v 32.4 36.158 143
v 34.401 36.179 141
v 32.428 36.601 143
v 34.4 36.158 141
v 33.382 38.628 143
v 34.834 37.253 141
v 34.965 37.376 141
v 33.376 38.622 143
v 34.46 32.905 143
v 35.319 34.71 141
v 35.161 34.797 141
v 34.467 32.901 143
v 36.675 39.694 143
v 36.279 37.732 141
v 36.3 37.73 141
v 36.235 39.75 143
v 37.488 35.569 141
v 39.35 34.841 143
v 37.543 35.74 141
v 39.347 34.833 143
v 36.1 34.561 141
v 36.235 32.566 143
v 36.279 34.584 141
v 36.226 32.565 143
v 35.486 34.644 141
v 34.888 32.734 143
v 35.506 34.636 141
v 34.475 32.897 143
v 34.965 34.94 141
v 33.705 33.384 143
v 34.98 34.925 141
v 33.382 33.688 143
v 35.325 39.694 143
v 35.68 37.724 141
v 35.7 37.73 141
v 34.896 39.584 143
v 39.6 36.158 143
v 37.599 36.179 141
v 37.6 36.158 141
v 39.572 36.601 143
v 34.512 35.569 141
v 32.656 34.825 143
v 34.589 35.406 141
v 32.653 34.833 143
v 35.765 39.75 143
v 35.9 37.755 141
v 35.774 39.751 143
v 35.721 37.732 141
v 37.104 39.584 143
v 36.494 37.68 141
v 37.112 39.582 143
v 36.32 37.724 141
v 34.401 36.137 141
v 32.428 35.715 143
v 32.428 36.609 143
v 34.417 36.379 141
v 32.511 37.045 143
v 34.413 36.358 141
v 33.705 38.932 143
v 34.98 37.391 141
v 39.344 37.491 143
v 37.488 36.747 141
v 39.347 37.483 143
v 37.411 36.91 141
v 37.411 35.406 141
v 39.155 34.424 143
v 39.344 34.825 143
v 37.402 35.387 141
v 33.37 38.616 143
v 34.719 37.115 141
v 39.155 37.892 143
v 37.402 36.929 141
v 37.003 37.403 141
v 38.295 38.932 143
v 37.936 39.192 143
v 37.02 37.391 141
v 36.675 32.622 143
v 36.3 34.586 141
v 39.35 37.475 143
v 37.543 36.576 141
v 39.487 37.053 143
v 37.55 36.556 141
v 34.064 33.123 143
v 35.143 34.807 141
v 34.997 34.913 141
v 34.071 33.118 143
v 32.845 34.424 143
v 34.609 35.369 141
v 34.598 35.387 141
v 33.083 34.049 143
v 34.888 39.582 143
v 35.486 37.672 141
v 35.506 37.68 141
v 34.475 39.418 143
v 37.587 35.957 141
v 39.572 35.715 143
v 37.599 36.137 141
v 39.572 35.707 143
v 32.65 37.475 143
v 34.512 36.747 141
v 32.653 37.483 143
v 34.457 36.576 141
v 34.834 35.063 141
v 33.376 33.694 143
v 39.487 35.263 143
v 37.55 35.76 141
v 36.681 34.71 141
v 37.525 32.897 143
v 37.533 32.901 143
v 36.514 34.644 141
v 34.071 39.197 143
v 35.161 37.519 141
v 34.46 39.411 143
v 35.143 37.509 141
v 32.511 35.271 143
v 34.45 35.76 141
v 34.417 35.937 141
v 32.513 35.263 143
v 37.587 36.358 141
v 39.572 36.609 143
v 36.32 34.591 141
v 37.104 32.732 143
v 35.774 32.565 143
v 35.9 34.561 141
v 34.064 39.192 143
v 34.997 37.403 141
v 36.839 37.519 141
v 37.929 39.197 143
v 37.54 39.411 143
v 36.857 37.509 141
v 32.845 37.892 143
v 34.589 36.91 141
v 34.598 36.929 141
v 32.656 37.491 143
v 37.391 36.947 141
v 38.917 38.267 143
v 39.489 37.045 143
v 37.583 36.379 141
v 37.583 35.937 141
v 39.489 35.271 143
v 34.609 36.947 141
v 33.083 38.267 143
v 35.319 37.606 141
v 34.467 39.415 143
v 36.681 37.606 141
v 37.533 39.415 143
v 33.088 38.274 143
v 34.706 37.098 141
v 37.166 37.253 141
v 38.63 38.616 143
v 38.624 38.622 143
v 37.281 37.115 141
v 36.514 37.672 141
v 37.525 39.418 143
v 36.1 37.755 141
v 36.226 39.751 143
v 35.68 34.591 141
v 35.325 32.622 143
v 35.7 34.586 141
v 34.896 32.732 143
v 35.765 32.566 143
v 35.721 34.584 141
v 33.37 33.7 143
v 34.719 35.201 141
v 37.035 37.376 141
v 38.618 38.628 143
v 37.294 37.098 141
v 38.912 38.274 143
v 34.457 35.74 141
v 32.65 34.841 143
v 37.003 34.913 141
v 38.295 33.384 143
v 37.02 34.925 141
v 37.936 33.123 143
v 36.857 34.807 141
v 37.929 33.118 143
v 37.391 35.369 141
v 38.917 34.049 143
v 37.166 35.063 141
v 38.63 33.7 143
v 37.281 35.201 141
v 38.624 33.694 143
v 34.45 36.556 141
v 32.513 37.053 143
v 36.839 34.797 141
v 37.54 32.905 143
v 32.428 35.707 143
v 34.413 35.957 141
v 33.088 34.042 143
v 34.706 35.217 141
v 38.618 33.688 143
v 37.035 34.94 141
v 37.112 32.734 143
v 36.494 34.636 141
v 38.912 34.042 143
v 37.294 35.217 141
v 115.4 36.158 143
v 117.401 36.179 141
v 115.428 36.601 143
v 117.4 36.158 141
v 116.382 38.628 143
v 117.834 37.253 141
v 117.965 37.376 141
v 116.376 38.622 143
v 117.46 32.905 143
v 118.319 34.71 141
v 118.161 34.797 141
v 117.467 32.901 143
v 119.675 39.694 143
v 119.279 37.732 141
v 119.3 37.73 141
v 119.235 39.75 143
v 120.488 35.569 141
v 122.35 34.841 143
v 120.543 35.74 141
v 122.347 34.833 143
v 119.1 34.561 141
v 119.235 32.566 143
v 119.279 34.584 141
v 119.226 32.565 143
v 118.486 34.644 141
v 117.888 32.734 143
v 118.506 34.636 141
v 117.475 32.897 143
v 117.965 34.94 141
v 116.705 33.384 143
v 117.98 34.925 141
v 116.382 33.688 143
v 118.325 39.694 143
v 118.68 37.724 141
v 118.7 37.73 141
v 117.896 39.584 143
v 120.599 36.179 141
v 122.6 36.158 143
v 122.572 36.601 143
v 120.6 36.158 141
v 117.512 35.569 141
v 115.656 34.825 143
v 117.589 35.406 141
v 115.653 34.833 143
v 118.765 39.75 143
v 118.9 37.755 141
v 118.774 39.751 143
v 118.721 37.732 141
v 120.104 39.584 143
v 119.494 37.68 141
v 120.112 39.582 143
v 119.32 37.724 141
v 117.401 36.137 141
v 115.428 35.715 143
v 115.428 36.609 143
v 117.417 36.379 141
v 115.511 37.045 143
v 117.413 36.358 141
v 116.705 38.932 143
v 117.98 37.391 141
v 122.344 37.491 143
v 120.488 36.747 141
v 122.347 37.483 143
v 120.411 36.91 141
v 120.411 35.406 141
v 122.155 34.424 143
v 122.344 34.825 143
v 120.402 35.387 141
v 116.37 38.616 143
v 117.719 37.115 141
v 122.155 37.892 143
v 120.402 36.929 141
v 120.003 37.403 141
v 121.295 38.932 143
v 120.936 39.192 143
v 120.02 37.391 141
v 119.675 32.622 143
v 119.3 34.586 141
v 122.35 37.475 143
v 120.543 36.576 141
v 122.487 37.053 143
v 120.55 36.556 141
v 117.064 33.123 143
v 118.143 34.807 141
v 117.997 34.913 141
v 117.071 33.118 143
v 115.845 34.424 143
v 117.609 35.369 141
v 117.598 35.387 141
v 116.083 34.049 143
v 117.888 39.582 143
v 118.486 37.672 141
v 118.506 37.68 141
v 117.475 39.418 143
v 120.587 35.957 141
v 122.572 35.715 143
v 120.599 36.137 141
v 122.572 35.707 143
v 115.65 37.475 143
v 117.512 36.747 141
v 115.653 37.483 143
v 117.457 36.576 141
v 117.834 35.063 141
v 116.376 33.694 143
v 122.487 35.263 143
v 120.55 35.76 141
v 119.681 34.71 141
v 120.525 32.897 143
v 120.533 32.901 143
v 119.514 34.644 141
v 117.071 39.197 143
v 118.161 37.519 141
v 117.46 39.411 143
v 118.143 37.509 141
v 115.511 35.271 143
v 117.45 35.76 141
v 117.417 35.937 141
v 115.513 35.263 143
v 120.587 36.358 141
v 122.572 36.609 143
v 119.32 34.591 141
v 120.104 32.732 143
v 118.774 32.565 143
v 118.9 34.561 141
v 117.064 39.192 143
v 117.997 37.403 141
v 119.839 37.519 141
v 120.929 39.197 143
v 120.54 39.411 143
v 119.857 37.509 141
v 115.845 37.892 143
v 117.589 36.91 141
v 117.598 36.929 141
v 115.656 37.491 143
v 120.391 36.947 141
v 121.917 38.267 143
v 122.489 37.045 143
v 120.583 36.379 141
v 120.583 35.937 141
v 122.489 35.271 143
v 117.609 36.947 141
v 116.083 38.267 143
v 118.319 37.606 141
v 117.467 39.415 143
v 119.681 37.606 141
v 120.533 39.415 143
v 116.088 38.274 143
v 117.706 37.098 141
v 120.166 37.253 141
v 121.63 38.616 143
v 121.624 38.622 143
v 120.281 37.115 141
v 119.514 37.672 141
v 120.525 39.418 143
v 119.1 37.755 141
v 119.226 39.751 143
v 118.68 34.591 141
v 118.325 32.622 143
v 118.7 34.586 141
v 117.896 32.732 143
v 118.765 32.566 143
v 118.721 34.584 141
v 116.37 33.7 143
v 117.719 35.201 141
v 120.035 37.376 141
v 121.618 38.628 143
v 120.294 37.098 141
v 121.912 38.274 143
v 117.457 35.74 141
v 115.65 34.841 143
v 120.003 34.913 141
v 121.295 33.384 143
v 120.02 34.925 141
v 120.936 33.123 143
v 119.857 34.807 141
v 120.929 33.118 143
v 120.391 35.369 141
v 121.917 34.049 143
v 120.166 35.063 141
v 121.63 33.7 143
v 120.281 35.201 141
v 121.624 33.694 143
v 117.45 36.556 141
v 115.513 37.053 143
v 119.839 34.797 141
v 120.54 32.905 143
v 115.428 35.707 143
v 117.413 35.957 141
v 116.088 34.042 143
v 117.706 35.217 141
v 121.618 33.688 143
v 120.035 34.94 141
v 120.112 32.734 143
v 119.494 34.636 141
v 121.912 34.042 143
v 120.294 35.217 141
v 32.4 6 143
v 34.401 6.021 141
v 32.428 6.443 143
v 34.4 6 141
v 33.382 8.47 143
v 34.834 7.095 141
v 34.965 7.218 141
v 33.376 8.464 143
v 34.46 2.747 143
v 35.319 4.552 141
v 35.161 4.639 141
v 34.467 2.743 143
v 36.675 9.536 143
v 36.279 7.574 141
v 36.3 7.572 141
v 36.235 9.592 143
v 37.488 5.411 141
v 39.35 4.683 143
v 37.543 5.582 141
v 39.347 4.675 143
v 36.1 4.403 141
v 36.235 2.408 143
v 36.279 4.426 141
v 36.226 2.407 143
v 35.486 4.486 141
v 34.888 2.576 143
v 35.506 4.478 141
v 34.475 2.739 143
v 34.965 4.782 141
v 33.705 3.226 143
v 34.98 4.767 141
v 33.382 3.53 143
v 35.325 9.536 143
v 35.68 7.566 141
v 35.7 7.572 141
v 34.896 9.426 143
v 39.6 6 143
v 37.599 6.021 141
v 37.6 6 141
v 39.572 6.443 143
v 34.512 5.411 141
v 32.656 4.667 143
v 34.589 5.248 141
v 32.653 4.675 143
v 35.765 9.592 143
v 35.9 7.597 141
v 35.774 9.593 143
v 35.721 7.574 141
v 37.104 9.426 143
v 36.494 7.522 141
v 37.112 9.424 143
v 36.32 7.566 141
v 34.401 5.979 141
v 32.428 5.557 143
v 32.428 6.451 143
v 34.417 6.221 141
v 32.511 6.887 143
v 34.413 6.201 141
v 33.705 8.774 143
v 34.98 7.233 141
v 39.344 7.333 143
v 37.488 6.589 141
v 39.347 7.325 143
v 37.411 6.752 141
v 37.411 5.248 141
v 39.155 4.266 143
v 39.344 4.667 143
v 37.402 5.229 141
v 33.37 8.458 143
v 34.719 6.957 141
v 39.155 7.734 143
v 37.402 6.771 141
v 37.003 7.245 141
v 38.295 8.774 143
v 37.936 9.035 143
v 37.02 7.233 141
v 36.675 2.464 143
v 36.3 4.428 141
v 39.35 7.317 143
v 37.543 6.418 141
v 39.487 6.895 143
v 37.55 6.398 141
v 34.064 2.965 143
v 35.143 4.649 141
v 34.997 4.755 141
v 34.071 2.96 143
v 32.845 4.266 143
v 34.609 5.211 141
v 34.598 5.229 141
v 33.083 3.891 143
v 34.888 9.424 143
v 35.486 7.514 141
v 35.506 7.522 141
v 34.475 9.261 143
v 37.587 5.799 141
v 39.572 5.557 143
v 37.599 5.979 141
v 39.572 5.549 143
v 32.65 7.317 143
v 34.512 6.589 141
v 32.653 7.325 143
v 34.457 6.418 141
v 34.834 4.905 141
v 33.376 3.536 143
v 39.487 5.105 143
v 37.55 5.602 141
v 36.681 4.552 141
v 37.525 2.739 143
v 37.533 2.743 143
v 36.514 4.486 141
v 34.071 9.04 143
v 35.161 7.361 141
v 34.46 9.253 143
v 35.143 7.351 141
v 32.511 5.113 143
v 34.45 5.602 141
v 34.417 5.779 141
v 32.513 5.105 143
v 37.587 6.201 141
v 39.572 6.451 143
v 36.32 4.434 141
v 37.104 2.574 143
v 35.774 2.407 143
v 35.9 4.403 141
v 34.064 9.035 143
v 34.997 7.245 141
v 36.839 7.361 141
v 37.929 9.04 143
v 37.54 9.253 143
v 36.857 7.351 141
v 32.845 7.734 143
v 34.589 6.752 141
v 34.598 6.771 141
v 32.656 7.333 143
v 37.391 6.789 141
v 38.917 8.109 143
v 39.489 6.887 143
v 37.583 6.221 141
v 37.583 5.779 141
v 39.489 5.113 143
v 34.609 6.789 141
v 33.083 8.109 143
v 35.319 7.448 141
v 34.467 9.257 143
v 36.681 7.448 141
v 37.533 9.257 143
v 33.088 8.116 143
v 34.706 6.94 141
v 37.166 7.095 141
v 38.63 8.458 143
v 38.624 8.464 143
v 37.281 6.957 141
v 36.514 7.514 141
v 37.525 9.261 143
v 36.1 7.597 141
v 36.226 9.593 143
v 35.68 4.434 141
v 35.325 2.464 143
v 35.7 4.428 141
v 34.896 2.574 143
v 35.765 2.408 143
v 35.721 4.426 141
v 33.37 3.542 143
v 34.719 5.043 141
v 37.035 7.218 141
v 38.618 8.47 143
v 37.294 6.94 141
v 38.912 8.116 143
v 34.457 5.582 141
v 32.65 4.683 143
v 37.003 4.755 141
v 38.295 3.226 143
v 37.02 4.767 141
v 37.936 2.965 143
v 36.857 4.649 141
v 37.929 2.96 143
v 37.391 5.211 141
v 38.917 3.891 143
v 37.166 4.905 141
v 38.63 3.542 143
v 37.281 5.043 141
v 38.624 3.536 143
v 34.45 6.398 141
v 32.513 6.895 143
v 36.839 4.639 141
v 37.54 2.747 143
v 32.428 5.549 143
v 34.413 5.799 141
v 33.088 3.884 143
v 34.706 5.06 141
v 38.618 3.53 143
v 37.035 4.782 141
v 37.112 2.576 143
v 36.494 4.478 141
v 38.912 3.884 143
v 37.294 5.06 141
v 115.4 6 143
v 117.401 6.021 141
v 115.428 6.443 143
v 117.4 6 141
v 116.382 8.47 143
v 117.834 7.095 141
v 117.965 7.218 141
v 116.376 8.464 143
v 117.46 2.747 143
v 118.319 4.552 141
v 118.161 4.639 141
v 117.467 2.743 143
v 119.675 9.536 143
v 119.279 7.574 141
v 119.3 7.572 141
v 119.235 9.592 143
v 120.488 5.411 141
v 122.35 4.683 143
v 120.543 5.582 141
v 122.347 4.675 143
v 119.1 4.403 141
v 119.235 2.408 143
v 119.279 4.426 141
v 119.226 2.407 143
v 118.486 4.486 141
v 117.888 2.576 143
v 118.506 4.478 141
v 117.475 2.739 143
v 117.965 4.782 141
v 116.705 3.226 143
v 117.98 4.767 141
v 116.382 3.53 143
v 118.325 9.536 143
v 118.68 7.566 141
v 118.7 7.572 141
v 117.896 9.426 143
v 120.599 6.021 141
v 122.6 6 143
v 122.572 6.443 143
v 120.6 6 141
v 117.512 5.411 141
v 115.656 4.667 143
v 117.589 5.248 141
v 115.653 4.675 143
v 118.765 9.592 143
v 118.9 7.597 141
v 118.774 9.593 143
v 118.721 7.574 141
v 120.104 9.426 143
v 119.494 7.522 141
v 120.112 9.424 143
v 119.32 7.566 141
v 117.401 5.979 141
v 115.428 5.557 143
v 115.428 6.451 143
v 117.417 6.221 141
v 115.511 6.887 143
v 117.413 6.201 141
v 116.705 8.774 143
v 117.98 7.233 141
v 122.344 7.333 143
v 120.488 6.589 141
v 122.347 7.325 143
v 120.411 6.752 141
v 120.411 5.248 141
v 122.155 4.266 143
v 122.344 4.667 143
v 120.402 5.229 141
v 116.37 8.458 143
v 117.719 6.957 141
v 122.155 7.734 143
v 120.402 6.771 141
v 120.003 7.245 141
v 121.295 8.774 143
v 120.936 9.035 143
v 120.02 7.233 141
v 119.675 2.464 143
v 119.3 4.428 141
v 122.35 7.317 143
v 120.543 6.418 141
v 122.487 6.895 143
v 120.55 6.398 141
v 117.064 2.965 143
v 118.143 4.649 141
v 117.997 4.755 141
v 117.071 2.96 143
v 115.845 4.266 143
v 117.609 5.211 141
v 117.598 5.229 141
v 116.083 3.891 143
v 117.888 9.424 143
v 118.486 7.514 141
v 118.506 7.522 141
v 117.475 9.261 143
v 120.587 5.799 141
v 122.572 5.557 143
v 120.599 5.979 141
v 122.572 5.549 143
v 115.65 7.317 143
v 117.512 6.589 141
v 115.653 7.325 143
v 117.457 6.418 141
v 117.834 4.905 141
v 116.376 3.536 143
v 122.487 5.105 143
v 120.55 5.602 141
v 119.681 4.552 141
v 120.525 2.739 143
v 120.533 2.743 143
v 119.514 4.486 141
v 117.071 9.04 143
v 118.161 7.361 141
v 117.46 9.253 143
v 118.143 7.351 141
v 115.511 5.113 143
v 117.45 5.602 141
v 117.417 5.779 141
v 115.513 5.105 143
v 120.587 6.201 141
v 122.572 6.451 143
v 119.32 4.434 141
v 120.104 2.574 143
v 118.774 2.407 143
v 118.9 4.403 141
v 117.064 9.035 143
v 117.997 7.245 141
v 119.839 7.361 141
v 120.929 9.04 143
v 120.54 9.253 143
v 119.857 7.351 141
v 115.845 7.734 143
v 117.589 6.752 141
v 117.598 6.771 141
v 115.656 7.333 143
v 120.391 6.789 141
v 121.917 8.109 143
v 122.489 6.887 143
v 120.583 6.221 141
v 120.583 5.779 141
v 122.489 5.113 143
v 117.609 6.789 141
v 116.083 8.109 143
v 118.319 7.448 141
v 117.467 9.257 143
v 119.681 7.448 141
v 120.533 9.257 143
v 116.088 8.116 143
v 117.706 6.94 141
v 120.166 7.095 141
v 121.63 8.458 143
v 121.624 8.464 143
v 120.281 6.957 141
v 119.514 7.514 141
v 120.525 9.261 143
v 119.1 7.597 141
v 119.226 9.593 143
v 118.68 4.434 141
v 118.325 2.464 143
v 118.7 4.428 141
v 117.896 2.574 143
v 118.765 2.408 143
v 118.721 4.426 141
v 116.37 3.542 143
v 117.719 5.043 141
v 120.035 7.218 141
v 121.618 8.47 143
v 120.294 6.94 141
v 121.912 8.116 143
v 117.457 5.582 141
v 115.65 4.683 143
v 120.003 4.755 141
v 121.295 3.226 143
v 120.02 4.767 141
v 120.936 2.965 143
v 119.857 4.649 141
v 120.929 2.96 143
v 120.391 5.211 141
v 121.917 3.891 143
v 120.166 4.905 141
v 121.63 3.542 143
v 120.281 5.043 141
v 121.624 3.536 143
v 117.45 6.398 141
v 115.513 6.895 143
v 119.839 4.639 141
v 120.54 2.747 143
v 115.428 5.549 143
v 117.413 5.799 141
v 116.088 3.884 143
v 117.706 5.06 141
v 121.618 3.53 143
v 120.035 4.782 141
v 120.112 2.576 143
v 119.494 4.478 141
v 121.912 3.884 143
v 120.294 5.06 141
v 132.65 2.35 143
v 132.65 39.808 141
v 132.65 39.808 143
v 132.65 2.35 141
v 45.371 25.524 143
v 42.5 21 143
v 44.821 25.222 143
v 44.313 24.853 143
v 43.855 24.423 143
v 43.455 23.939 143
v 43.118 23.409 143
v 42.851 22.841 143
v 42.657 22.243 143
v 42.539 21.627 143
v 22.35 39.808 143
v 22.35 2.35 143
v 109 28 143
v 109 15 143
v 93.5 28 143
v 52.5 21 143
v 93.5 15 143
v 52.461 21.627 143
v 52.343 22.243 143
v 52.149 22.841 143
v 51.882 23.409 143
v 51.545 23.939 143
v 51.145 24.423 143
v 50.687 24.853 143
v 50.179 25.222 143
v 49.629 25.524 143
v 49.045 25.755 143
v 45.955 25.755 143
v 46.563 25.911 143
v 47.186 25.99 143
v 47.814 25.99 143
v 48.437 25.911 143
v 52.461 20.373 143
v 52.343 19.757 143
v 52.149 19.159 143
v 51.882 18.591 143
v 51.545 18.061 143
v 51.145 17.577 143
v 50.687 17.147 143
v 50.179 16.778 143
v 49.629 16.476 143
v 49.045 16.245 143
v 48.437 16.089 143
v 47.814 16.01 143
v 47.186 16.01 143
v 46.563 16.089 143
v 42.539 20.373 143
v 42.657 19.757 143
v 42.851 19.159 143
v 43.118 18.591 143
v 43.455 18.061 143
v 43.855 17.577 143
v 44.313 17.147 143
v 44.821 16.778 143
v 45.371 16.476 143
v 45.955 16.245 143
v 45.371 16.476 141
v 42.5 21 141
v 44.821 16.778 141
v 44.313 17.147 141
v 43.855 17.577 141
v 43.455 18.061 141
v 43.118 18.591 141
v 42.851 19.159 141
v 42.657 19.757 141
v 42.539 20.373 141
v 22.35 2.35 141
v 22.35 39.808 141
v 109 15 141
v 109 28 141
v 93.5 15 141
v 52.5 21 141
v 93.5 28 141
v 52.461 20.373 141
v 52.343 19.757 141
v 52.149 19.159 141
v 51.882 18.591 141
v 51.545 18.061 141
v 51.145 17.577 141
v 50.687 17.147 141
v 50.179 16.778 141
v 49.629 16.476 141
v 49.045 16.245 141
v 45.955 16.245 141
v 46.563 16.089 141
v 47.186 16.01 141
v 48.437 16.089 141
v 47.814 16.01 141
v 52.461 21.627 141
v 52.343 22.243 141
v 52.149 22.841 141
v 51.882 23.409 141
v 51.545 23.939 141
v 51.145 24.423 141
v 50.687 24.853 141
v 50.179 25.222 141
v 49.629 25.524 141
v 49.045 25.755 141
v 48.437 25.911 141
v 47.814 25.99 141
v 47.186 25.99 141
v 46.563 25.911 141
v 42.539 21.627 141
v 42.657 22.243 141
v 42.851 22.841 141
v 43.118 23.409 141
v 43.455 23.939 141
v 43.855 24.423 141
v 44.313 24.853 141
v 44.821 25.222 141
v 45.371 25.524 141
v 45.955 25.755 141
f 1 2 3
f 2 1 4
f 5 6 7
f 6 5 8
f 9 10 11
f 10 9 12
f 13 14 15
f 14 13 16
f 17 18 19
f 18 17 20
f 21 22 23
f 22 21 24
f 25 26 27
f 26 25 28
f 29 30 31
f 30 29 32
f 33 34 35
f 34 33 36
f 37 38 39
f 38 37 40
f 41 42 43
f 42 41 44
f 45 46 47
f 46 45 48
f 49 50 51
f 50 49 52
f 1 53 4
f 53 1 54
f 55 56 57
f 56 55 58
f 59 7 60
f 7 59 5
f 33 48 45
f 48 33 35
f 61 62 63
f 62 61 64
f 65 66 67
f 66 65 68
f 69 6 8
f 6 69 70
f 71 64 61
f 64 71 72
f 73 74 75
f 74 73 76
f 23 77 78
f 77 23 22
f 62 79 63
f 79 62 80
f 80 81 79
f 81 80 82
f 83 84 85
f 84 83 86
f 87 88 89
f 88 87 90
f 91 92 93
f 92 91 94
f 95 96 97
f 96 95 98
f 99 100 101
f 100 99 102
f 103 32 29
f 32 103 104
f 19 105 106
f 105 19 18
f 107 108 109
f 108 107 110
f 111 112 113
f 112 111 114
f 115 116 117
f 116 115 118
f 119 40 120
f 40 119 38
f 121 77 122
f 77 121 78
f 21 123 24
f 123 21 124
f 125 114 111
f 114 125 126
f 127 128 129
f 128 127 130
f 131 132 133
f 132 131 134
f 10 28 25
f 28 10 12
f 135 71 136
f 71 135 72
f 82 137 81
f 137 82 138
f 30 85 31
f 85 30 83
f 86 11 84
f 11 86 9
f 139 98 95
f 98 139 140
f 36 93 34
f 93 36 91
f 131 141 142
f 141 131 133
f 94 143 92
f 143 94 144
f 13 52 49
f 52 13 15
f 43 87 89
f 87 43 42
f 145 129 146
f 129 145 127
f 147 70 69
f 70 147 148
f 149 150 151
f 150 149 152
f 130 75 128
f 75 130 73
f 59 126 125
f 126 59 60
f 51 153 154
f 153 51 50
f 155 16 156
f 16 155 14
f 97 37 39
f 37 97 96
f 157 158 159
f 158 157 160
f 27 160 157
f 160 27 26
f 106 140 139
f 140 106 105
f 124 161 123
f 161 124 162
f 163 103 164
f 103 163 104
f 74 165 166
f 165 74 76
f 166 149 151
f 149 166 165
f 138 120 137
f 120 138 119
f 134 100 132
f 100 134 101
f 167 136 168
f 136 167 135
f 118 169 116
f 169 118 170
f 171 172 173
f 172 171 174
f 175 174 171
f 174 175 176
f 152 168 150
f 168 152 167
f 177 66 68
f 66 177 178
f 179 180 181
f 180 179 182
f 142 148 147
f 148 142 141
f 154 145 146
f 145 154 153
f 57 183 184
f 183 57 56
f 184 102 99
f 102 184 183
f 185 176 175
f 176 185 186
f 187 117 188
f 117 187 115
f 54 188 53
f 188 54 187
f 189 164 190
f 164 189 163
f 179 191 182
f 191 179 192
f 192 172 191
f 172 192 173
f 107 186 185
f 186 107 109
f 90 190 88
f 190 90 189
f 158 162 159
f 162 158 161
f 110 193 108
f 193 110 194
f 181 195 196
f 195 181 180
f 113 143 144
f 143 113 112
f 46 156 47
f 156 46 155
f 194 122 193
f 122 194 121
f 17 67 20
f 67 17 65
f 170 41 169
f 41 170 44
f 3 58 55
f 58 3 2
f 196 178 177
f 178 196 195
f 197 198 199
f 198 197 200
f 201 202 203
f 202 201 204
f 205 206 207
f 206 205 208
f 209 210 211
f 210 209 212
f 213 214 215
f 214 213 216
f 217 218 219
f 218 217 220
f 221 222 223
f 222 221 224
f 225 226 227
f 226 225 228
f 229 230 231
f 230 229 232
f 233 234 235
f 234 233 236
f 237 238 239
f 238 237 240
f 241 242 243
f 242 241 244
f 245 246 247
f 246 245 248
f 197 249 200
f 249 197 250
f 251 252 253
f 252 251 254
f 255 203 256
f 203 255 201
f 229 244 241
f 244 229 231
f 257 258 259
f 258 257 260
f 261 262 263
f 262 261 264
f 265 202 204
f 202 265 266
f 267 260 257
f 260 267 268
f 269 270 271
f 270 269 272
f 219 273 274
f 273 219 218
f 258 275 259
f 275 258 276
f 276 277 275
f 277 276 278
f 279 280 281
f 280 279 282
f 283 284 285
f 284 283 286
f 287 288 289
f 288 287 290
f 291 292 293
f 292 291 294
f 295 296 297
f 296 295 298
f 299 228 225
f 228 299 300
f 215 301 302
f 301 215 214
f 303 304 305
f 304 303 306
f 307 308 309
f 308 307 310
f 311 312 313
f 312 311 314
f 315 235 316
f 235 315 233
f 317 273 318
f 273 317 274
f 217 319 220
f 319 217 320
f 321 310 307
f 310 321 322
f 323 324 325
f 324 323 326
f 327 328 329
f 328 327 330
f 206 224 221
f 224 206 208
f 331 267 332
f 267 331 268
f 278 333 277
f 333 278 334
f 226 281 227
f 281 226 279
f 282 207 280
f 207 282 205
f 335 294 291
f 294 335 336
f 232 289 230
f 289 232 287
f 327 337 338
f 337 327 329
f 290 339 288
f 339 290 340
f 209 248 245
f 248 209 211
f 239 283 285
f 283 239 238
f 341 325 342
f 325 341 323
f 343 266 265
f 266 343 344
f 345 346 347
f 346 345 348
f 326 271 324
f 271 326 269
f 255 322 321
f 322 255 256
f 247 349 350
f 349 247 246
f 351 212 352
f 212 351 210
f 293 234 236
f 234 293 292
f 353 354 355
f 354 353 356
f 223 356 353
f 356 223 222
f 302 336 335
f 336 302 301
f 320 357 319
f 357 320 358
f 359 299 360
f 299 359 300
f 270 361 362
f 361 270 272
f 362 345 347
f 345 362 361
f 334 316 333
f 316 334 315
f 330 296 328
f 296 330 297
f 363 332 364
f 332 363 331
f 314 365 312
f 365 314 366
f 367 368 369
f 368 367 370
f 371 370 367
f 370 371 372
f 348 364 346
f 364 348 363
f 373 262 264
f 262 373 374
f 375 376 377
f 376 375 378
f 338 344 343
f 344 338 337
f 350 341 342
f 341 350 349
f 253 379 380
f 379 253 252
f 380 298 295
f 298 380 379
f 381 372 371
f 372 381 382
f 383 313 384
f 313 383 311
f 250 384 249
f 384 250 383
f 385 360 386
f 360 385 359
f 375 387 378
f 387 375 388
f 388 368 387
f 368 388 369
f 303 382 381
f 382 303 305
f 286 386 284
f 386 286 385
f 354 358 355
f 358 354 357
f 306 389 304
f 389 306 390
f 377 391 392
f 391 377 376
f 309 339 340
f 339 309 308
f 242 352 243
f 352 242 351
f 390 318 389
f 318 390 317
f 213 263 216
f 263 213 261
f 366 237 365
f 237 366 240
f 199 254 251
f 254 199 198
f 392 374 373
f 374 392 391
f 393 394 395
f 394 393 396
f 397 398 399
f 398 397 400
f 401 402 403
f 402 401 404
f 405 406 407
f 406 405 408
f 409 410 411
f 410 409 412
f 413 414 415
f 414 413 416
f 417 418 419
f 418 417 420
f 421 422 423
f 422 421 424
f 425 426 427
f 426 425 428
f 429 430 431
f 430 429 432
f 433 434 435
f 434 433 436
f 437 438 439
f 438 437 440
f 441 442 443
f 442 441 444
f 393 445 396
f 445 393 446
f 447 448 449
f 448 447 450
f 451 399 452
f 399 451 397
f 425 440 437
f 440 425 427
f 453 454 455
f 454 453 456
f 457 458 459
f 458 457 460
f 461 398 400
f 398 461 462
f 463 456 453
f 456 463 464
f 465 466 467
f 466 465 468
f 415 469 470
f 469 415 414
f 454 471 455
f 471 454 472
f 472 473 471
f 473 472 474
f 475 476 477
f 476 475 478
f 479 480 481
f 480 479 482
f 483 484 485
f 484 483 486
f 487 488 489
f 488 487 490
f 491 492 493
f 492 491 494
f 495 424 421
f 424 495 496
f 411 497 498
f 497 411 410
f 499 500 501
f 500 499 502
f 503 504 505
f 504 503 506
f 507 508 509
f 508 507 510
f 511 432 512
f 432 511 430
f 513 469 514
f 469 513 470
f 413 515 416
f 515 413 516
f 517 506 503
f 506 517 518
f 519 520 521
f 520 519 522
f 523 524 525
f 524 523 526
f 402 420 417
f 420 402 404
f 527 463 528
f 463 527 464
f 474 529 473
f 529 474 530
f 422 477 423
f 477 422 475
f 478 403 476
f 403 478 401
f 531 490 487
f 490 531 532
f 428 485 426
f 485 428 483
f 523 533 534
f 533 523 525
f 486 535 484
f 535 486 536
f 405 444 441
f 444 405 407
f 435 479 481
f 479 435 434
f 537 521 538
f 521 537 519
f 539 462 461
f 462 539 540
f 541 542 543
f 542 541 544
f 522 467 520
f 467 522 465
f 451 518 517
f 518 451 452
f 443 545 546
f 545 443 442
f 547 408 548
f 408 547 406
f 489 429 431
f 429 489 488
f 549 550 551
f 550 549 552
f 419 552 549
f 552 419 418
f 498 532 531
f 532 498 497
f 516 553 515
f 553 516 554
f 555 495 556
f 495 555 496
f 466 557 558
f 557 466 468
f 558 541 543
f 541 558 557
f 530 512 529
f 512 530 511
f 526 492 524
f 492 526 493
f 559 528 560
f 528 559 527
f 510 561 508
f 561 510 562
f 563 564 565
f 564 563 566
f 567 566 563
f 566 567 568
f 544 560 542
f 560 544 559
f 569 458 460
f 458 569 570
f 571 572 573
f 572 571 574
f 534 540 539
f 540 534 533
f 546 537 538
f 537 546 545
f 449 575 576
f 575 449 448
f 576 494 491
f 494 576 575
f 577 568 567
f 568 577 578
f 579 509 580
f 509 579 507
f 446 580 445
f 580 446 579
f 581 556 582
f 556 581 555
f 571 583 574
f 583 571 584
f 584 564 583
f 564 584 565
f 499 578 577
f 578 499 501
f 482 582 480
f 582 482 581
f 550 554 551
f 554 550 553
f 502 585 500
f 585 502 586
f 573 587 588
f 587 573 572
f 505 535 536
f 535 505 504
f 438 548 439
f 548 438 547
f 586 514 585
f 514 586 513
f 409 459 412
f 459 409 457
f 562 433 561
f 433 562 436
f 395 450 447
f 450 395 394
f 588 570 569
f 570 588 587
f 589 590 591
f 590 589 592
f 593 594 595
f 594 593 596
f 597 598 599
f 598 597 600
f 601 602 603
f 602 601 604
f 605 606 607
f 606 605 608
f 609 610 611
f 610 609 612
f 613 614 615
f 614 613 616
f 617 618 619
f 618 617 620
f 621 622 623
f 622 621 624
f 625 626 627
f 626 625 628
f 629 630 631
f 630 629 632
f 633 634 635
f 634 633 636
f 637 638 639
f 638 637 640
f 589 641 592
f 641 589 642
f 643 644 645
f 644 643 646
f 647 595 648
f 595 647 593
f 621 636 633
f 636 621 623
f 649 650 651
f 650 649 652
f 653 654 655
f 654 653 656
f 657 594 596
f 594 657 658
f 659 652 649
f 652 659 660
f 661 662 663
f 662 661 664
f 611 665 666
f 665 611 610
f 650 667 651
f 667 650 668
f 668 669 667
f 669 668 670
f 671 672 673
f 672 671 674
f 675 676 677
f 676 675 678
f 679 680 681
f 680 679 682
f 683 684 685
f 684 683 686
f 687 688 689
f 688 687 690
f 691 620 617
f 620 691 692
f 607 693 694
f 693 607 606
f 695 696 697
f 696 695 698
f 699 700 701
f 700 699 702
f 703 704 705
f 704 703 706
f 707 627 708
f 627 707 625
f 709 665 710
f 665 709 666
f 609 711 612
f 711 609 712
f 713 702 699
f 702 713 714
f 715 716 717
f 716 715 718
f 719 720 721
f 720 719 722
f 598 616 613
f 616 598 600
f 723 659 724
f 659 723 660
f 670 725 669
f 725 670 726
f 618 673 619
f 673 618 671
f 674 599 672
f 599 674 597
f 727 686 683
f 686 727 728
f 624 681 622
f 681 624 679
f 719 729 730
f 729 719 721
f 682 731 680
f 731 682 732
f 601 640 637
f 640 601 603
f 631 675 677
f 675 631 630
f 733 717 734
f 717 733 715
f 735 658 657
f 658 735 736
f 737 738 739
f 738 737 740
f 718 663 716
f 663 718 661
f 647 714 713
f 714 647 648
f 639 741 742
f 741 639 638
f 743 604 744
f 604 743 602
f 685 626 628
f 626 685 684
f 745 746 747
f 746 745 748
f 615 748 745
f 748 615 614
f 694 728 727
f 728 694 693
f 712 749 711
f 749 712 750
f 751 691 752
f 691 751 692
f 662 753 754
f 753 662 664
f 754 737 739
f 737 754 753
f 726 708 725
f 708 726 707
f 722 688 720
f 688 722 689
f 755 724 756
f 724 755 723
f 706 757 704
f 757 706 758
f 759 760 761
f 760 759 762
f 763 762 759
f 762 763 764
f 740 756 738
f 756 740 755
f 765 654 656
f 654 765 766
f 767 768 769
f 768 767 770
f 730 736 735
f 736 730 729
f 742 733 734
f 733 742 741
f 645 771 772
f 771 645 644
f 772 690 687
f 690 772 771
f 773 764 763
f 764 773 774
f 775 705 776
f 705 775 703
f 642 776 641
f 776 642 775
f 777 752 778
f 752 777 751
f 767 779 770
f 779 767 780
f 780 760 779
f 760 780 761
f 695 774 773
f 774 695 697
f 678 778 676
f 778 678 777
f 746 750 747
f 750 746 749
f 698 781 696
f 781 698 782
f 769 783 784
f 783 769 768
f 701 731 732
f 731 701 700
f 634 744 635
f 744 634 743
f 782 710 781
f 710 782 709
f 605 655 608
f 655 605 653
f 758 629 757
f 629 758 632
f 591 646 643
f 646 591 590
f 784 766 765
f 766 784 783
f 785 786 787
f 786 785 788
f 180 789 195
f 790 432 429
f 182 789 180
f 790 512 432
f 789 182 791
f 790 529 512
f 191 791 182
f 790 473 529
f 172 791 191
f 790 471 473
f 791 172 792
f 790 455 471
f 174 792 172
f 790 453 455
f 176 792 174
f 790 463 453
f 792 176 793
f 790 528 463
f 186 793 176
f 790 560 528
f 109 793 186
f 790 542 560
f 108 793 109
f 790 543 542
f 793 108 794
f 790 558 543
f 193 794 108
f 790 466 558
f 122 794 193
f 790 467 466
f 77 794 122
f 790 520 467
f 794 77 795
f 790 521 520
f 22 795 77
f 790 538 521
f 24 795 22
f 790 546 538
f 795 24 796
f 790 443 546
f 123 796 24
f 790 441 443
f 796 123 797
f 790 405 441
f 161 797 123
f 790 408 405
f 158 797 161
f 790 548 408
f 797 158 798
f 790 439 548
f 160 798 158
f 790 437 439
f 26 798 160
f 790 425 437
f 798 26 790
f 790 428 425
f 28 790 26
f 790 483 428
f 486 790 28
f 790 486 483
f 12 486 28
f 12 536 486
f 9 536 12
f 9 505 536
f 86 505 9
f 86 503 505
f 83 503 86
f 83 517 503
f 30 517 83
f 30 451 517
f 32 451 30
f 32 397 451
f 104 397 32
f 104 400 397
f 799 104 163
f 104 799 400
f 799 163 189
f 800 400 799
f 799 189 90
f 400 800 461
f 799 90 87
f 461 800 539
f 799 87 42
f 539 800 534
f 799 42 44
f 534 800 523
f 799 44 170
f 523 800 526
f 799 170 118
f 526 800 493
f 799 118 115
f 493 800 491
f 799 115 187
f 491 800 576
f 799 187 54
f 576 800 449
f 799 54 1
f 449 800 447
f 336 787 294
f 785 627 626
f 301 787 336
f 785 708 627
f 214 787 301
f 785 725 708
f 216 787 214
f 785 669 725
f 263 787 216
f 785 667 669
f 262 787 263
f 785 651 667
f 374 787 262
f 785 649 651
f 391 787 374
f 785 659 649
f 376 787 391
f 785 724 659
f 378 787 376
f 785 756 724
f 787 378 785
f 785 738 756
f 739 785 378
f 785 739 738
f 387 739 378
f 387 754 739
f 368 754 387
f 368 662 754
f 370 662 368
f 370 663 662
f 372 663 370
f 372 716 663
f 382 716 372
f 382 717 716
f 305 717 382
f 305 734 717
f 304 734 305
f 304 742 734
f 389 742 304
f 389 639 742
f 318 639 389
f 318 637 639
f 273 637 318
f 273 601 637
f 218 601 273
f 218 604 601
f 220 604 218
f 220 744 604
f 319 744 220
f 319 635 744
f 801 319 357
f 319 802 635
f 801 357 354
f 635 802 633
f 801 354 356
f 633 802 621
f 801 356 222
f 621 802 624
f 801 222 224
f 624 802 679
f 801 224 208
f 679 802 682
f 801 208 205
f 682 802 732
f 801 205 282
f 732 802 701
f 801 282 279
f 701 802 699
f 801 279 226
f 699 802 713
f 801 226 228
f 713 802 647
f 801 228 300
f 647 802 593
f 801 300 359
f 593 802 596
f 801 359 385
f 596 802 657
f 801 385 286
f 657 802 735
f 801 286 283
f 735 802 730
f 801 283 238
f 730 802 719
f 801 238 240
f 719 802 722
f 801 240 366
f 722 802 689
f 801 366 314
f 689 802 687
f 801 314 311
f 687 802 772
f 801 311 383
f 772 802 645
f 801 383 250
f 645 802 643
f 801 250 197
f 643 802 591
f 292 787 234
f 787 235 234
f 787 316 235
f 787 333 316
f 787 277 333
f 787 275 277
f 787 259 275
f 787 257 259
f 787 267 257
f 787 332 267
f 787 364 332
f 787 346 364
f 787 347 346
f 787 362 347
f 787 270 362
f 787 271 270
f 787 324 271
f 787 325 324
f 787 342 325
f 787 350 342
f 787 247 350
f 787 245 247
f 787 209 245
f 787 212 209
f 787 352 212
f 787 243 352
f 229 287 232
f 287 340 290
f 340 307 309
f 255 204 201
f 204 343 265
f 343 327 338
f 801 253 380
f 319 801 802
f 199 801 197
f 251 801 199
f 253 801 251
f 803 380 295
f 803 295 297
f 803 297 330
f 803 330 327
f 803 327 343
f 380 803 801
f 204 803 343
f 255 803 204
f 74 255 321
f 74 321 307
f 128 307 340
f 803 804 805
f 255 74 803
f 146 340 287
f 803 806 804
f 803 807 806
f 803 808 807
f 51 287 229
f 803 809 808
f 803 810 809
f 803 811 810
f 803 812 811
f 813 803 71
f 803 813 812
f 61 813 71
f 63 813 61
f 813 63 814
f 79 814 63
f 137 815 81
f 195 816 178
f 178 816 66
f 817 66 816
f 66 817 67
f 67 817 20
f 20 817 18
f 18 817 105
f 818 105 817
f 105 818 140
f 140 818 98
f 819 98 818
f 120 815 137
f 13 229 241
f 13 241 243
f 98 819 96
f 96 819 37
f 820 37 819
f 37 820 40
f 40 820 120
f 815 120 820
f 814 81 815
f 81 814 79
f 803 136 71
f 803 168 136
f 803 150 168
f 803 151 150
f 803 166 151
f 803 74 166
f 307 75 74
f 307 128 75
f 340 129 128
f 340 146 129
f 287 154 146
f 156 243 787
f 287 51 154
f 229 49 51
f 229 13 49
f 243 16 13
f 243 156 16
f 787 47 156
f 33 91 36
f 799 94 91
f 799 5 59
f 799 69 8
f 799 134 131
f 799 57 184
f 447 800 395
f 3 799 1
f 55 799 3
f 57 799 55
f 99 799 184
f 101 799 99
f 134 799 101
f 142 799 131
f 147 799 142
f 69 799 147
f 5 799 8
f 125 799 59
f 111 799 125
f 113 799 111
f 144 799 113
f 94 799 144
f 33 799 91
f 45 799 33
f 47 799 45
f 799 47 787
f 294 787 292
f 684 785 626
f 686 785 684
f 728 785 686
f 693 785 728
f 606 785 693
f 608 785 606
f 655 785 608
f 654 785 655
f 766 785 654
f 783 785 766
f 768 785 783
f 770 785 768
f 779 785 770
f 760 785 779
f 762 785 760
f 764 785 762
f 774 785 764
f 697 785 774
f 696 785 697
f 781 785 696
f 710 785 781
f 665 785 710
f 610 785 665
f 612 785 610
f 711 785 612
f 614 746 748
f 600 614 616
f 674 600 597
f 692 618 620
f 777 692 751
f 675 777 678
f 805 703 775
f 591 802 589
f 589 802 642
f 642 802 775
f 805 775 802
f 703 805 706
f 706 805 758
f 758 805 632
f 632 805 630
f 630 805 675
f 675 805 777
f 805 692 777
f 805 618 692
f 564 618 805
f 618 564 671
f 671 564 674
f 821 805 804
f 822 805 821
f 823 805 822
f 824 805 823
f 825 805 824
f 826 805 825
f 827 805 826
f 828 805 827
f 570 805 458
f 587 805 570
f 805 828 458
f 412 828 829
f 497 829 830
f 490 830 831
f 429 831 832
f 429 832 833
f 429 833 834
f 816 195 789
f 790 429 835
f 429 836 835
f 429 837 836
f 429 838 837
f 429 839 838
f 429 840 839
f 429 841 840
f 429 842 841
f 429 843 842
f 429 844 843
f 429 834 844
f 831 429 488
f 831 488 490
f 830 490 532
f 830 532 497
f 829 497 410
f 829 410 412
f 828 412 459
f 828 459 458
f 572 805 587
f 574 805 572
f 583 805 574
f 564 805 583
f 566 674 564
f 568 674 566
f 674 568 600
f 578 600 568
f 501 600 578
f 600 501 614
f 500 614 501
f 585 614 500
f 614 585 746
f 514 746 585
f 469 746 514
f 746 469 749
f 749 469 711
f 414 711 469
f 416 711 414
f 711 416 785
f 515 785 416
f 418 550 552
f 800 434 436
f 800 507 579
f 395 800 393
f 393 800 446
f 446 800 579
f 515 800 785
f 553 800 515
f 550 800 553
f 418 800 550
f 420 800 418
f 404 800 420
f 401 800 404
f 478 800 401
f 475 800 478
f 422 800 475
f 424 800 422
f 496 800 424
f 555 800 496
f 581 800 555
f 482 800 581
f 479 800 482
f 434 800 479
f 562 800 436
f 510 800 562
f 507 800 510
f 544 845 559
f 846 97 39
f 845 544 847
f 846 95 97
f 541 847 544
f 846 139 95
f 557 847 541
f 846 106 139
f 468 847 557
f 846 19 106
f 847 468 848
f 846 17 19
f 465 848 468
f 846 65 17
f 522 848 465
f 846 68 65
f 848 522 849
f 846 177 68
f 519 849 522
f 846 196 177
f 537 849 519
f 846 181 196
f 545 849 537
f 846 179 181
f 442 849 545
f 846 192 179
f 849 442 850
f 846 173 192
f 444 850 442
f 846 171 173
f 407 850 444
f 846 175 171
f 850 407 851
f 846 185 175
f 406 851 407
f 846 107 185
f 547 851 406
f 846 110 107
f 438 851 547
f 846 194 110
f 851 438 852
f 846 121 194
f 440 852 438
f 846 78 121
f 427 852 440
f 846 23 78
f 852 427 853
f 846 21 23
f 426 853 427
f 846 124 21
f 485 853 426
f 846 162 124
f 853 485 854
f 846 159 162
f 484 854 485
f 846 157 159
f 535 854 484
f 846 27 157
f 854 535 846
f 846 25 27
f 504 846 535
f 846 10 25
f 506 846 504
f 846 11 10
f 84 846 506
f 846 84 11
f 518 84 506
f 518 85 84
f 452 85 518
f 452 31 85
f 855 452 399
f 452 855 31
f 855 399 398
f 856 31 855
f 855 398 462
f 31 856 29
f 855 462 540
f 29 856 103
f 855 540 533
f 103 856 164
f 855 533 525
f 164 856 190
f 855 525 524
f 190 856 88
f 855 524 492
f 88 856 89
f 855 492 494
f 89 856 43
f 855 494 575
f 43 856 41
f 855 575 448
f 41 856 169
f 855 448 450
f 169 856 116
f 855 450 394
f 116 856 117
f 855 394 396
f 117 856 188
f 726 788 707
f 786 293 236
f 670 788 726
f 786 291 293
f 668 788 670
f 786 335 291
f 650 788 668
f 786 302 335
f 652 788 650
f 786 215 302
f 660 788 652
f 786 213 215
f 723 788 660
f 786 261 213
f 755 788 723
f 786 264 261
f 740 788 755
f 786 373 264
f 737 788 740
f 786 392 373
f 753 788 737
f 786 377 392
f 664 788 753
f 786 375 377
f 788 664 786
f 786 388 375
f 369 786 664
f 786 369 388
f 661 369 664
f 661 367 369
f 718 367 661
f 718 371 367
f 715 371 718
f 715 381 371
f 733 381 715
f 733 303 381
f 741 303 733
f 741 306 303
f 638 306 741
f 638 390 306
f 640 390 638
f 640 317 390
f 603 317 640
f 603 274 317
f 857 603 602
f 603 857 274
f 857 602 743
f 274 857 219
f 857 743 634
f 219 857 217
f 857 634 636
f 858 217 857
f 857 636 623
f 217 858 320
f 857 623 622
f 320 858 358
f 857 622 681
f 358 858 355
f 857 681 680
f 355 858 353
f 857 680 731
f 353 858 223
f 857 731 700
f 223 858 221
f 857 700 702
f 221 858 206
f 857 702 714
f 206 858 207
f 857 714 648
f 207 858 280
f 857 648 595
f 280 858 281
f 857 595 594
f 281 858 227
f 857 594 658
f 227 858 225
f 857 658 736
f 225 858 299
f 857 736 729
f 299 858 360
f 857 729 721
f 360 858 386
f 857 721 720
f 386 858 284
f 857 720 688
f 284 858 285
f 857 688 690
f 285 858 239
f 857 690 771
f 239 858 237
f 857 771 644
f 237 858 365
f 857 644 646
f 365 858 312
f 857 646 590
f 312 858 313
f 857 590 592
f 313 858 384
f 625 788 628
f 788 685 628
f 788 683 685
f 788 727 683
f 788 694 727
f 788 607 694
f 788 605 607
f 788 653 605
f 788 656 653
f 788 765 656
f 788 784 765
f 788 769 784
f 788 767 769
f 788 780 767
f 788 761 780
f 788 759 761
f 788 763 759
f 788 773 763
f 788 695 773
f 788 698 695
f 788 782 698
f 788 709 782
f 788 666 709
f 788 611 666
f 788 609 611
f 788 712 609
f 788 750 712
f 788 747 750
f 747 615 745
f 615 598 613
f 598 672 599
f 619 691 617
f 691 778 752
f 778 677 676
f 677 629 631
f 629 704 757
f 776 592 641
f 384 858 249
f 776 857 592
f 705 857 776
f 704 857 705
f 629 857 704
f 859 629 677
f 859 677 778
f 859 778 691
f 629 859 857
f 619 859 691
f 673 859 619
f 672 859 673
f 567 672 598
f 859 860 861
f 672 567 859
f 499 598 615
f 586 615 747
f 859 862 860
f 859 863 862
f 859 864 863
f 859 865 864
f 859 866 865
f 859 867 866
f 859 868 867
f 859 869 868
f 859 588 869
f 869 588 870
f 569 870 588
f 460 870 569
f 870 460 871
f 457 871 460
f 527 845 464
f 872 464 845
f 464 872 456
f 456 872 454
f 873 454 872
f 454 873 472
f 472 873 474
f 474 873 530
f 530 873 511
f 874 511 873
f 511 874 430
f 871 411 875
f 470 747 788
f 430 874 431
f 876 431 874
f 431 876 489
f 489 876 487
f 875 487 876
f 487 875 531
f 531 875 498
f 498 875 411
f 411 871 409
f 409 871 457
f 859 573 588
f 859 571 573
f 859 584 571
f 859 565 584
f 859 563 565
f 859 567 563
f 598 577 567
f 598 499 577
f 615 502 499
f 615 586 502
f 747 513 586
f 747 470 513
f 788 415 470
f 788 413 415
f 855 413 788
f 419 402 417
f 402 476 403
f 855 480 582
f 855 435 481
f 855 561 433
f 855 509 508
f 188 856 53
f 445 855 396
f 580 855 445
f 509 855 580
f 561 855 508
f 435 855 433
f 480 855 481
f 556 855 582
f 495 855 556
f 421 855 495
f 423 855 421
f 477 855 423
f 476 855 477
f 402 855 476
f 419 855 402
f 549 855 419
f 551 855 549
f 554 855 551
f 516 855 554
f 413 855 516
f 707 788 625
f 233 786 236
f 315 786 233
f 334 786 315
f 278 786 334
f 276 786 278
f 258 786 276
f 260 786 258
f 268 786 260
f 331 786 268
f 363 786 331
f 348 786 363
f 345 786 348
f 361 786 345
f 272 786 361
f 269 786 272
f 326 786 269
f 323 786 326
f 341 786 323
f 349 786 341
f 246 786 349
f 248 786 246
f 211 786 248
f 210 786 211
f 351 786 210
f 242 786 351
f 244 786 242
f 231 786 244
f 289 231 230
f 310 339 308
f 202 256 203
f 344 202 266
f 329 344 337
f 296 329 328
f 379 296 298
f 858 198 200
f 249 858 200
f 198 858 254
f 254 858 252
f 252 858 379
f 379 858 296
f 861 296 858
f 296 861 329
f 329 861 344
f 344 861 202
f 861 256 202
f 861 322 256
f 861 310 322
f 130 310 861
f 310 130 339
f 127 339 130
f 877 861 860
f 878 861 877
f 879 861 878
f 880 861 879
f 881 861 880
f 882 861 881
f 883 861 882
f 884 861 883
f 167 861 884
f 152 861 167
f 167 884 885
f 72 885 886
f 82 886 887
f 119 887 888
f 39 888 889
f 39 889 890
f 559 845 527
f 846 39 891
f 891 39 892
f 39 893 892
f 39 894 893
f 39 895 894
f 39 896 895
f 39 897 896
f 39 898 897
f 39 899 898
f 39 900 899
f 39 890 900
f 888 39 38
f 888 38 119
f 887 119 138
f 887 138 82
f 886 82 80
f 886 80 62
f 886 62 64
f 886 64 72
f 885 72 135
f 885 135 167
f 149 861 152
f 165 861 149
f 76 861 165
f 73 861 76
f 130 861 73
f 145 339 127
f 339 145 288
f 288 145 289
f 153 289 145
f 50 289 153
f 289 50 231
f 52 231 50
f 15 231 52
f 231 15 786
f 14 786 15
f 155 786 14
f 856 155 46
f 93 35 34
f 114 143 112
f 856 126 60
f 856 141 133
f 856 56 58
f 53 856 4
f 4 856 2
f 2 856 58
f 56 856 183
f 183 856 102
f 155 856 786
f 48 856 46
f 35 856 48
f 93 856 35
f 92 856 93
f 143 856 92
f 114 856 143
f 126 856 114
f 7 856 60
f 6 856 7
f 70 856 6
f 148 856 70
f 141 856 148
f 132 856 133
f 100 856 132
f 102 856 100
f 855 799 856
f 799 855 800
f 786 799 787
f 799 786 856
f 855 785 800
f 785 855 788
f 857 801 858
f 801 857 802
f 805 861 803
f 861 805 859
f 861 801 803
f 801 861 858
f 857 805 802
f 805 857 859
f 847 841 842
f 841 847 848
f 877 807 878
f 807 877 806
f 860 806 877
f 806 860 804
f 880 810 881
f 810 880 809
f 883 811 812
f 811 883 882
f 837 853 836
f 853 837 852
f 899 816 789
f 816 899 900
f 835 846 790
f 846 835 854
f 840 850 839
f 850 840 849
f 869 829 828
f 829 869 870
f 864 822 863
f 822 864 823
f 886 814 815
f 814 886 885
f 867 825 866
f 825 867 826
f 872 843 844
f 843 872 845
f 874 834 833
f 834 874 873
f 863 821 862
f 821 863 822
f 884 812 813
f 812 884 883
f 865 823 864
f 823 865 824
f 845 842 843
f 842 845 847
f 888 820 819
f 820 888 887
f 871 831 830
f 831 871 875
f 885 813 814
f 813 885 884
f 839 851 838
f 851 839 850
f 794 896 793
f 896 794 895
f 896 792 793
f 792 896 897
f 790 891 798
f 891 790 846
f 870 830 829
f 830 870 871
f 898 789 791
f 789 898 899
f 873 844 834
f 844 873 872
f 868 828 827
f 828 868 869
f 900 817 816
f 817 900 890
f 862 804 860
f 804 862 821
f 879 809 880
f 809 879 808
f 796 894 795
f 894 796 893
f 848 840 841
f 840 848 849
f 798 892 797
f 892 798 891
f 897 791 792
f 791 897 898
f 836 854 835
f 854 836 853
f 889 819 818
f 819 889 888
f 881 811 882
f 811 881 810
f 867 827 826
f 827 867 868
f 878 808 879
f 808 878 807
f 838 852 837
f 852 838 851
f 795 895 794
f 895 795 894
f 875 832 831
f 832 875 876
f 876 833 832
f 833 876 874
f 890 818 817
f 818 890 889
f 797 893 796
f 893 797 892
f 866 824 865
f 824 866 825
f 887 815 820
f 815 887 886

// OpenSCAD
include<../sixinch_library.scad>


  ///////////////////////////////
 // SmartThing Hub v2         //
///////////////////////////////

print_frontplate_sml = false;
print_handle_sml     = false;
print_cabinet_sml    = 0;
print_lid            = 0;
print_rear           = 1;
model                = 0;

units = 3;
depth = 140;

module model() {
    rotate([-90,0,0]){
        translate([22, -135, 4])
          difference(){
            union(){
                color([1,1,1]) {
                 fillet = 20;
                    linear_extrude(height = 34)
                    translate([fillet,fillet,0]){
                        offset(r=fillet) {
                            square([110 - 2* fillet, 126 - 2*fillet]);
                        }
                    }
                }
            }
            color([0.5, 0.5, 0.5]) 
            union() {
                translate([67, -1, 10]) 
                    cube([15.5, 16, 13]);
                
                translate([25,-1,15])
                    rotate([270,0,0])
                        cylinder(15.5, 5, 5);
            }
            
          }
      }
}


if(print_frontplate_sml){ // Frontplate //
    square_hole        = [];
    round_hole         = [];
    round_peg          = [];   
    screw_side_front   = [];
    screw_top          = [36];
    screw_bottom_front = [36];
    frontplate(units,square_hole,round_hole,round_peg,screw_side_front,screw_top,screw_bottom_front);

}

if(print_handle_sml){ // Handle // 
    lay_flat_for_print = false;   
    handle(units,lay_flat_for_print);
}

if(print_cabinet_sml){ // Cabinet //  
    w=88;
    h=70;
    screw_bottom_front = [36];
    screw_side_front   = [];
    round_peg          = [
        [25,  8, 15, 0, 15],  // Pillar in front
        [85,  8, 15, 0, 15],  // Pillar in front
                              
        [5,   80, 10, 0, 15],  // Pillar to the near right
        [5,  120, 10, 0, 15],  // Pillar to the far right

        [105, 80, 10, 0, 15],  // Pillar to the near left
        [105, 120, 10, 0, 15],  // Pillar to the far left

        [55,  70, 45, 0,  8],  // Pillar under the switch
    
    ];
    difference() {
        cabinet(depth,units,screw_bottom_front,round_peg,screw_side_front, true);
        model();
    }
}

if(print_lid){ // Lid // 
    screw_front = [36];//mm
    screw_back  = [36];//mm
    remove = true;
    difference () {
        lid(depth, units, screw_front, screw_back, true);        
        model();
    }
}

if(print_rear){  // Back plate //    
    square_hole  = [
        [71.5, 13, 15.5, 13],
    ];
    round_hole   = [
        [25.5, 19, 10, 13]
    ];
    screw_top    = [36];//mm
    screw_bottom = [36];//mm
    screw_side   = [];
    back_plate(units, depth, screw_top, screw_bottom, screw_side, square_hole,round_hole);
}  


// EdgeRouter X model
if(model) {
  model();
}
